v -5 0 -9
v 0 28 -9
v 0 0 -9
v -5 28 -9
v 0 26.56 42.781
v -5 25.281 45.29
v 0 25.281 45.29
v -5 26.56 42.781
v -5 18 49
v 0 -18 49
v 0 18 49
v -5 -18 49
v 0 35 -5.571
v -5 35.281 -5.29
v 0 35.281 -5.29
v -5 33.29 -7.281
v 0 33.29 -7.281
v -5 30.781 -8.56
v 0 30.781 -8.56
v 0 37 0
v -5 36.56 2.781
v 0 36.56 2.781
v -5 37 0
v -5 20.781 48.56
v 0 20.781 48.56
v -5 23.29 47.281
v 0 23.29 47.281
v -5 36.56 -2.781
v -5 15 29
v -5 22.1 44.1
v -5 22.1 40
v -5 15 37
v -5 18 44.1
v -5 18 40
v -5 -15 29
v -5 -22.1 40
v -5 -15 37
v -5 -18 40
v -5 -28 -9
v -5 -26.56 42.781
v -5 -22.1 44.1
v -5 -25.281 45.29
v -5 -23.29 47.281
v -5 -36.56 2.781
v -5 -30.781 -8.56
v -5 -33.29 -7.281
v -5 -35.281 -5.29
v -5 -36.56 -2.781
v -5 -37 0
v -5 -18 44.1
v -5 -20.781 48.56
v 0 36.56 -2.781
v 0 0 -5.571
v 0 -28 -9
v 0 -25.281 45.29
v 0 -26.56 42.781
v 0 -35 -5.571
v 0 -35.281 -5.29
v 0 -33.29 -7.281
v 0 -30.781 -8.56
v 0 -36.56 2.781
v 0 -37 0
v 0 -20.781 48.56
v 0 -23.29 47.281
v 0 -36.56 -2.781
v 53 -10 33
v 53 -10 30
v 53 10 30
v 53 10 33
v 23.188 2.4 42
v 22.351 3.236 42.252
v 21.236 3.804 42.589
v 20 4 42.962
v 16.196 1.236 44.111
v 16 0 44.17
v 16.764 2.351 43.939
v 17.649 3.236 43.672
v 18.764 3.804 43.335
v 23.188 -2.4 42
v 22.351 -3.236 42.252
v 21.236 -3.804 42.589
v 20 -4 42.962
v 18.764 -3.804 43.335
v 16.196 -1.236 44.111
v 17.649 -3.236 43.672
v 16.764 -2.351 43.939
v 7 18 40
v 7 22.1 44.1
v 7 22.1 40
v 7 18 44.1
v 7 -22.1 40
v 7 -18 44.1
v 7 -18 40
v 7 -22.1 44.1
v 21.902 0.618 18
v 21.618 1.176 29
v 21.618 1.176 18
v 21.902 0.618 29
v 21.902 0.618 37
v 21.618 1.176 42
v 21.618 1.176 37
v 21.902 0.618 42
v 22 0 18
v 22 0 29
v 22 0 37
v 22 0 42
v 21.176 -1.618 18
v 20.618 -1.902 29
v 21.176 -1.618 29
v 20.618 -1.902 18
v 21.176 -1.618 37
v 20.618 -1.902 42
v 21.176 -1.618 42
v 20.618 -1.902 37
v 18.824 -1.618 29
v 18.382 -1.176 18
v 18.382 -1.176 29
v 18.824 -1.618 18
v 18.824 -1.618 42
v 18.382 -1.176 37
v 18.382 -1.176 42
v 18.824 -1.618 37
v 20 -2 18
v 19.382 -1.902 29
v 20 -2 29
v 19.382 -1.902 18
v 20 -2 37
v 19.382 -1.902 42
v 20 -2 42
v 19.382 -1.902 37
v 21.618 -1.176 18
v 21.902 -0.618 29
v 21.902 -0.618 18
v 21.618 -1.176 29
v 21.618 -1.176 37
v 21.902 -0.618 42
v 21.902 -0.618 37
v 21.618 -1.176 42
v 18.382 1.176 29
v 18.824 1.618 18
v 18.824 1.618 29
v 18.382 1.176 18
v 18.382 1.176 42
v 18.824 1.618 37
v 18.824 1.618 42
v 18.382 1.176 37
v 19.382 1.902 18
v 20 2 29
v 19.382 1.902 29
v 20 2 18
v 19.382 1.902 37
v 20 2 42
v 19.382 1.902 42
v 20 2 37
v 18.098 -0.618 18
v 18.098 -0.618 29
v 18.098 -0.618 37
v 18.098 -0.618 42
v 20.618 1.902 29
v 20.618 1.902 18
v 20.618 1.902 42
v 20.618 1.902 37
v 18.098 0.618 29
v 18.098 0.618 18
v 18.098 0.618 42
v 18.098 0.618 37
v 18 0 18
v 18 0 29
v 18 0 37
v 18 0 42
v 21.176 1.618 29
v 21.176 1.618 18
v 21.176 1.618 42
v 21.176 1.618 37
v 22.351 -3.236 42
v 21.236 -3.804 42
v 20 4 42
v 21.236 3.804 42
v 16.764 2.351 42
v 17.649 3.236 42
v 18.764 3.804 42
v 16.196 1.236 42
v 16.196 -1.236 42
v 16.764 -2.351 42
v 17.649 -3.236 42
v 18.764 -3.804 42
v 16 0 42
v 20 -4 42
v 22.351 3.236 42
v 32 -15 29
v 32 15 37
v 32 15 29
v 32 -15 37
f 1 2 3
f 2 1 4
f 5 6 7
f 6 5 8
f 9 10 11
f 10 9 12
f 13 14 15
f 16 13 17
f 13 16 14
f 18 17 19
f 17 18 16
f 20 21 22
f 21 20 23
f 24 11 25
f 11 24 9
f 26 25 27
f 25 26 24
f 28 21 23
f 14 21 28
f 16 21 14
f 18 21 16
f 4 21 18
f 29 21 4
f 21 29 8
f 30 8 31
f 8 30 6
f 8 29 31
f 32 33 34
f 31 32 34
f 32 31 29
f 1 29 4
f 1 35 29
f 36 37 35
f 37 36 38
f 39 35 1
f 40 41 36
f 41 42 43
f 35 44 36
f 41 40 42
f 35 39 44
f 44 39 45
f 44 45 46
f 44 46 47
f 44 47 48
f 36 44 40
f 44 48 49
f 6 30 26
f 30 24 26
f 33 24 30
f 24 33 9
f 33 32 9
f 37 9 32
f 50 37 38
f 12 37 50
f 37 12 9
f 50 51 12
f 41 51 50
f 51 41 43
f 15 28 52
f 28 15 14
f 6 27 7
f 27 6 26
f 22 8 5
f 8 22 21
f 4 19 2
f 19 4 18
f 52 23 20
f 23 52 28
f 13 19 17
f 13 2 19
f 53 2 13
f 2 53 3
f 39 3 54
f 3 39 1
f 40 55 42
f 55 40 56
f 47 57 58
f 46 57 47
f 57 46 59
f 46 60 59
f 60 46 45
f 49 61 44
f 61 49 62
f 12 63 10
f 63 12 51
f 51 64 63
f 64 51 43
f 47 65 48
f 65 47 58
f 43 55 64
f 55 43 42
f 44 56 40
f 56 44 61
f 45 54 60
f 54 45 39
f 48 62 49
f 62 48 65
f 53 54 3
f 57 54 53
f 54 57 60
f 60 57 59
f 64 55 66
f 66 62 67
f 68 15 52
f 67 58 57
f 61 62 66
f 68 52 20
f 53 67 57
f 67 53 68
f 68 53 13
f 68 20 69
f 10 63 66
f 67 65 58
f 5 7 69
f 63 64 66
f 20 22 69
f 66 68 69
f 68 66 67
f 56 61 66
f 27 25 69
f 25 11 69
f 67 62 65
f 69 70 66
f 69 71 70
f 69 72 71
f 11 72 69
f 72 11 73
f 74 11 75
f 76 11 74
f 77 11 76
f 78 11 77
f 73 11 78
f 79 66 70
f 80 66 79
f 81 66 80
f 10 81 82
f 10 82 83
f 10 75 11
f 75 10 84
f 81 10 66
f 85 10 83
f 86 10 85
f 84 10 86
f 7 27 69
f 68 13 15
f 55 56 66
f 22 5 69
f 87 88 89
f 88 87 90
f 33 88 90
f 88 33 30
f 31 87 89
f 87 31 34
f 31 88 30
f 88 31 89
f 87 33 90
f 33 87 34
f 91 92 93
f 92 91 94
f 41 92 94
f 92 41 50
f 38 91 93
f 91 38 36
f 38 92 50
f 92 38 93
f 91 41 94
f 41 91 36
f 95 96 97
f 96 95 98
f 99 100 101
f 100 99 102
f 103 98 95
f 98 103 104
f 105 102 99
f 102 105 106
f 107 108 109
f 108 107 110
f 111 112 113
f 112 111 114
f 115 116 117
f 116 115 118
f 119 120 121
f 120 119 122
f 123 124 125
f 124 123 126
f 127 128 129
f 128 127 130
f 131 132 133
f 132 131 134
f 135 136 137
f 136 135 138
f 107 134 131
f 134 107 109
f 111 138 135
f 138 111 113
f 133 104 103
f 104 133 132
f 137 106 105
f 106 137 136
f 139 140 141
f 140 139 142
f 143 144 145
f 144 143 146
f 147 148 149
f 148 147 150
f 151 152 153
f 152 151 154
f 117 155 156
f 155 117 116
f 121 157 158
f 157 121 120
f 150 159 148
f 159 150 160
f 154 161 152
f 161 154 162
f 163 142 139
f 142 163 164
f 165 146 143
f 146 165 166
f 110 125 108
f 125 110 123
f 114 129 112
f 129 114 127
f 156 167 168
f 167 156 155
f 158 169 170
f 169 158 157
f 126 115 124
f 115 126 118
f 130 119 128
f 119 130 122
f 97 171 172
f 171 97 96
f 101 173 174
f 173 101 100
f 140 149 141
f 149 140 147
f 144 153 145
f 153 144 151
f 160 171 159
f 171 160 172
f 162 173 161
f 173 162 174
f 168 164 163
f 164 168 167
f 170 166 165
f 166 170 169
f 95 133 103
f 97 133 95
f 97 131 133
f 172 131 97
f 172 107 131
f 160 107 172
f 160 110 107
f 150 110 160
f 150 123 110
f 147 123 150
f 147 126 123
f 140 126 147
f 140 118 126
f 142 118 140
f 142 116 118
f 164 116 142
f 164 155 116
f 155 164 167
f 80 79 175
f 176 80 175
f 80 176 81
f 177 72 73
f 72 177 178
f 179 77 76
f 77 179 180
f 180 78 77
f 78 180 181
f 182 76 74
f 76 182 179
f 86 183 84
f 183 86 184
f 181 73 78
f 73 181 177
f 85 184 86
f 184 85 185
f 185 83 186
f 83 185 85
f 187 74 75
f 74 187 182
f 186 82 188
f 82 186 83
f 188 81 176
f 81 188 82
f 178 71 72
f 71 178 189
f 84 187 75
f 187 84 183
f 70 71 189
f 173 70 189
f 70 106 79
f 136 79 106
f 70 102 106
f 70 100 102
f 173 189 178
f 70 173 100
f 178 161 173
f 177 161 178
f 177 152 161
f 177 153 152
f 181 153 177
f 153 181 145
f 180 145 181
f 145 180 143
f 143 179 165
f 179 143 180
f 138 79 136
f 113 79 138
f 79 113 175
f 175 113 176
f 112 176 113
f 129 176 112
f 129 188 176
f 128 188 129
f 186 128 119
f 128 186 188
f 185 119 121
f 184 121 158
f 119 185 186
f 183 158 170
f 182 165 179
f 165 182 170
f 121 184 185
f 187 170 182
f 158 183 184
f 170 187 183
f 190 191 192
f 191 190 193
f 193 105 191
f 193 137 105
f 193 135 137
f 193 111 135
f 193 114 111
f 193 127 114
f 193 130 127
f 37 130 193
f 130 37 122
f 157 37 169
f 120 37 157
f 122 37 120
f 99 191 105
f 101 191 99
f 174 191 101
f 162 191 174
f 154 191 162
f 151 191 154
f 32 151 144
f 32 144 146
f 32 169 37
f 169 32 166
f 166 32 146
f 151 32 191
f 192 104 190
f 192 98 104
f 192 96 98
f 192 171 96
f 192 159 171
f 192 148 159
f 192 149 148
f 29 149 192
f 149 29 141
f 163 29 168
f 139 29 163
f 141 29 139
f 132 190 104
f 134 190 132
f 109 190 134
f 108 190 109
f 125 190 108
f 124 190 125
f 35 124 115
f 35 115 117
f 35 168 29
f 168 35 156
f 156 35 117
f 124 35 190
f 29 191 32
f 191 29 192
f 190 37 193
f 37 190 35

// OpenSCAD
t = 5;

rx = 100;
rdy = 4.1;
roy = 36;
royl = 58;


p0 = [0,0,18];
p1 = [0,28,18];
p2 = [40,18,18];
p3 = [40,0,18];


k = 12;


module rails(oz=2) {
    
  translate([-rx/2,roy/2,oz]) cube([rx,rdy,rdy]);
  mirror([0,1,0]){
    translate([-rx/2,roy/2,oz]) cube([rx,rdy,rdy]);
  }
    
}

module railsLow(oz=2) {
    
  translate([-rx/2,royl/2,oz]) cube([rx,rdy,rdy]);
  mirror([0,1,0]){
    translate([-rx/2,royl/2,oz]) cube([rx,rdy,rdy]);
  }
    
}


module span() {
difference(){
  hull(){
    translate([p0[0],p0[1],0])cylinder(r=p0[2]/2, h=t, $fn=20);
    translate([p1[0],p1[1],0])cylinder(r=p1[2]/2, h=t, $fn=20);
    translate([p2[0],p2[1],0])cylinder(r=p2[2]/2, h=t, $fn=20);
    translate([p3[0],p3[1],0])cylinder(r=p3[2]/2, h=t, $fn=20);

  }
  
  hull(){
    translate([p0[0]+3,p0[1]-3,-1])cylinder(r=p0[2]/k, h=2*t, $fn=20);
    translate([p1[0]+3,p1[1]-3,-1])cylinder(r=p1[2]/k, h=2*t, $fn=20);
    translate([p2[0]-3,p2[1]-3,-1])cylinder(r=p2[2]/k, h=2*t, $fn=20);
    translate([p3[0]-3,p3[1]-3,-1])cylinder(r=p3[2]/k, h=2*t, $fn=20);
  }

  translate([-120/2,-70,-1])cube([120,70,10]);
}
}

module spanComplete() {
    difference() {
    rotate([0,-90,0])
    union(){
      span();
      mirror([0,1,0])span();
    };

    translate([0,0,38])rails();
    translate([0,0,-5])railsLow();

    } 
}

module nose() {
    
  hull(){
  difference(){
    translate([0,0,0])spanComplete();
    translate([-6,-70/2,-30]) cube([12,70,60]);
  }
  
  
  translate([50,-20/2,30]) cube([3,20,3]);
  }
}

difference(){
union(){
  nose();
  spanComplete();
}
translate([-43,0,38])rails();
translate([20,0,18])cylinder(r=2,h=40,$fn=20);
translate([20,0,42])cylinder(r=4,h=40,$fn=20);
translate([-6,-30/2,29]) cube([38,30,8]);
}
